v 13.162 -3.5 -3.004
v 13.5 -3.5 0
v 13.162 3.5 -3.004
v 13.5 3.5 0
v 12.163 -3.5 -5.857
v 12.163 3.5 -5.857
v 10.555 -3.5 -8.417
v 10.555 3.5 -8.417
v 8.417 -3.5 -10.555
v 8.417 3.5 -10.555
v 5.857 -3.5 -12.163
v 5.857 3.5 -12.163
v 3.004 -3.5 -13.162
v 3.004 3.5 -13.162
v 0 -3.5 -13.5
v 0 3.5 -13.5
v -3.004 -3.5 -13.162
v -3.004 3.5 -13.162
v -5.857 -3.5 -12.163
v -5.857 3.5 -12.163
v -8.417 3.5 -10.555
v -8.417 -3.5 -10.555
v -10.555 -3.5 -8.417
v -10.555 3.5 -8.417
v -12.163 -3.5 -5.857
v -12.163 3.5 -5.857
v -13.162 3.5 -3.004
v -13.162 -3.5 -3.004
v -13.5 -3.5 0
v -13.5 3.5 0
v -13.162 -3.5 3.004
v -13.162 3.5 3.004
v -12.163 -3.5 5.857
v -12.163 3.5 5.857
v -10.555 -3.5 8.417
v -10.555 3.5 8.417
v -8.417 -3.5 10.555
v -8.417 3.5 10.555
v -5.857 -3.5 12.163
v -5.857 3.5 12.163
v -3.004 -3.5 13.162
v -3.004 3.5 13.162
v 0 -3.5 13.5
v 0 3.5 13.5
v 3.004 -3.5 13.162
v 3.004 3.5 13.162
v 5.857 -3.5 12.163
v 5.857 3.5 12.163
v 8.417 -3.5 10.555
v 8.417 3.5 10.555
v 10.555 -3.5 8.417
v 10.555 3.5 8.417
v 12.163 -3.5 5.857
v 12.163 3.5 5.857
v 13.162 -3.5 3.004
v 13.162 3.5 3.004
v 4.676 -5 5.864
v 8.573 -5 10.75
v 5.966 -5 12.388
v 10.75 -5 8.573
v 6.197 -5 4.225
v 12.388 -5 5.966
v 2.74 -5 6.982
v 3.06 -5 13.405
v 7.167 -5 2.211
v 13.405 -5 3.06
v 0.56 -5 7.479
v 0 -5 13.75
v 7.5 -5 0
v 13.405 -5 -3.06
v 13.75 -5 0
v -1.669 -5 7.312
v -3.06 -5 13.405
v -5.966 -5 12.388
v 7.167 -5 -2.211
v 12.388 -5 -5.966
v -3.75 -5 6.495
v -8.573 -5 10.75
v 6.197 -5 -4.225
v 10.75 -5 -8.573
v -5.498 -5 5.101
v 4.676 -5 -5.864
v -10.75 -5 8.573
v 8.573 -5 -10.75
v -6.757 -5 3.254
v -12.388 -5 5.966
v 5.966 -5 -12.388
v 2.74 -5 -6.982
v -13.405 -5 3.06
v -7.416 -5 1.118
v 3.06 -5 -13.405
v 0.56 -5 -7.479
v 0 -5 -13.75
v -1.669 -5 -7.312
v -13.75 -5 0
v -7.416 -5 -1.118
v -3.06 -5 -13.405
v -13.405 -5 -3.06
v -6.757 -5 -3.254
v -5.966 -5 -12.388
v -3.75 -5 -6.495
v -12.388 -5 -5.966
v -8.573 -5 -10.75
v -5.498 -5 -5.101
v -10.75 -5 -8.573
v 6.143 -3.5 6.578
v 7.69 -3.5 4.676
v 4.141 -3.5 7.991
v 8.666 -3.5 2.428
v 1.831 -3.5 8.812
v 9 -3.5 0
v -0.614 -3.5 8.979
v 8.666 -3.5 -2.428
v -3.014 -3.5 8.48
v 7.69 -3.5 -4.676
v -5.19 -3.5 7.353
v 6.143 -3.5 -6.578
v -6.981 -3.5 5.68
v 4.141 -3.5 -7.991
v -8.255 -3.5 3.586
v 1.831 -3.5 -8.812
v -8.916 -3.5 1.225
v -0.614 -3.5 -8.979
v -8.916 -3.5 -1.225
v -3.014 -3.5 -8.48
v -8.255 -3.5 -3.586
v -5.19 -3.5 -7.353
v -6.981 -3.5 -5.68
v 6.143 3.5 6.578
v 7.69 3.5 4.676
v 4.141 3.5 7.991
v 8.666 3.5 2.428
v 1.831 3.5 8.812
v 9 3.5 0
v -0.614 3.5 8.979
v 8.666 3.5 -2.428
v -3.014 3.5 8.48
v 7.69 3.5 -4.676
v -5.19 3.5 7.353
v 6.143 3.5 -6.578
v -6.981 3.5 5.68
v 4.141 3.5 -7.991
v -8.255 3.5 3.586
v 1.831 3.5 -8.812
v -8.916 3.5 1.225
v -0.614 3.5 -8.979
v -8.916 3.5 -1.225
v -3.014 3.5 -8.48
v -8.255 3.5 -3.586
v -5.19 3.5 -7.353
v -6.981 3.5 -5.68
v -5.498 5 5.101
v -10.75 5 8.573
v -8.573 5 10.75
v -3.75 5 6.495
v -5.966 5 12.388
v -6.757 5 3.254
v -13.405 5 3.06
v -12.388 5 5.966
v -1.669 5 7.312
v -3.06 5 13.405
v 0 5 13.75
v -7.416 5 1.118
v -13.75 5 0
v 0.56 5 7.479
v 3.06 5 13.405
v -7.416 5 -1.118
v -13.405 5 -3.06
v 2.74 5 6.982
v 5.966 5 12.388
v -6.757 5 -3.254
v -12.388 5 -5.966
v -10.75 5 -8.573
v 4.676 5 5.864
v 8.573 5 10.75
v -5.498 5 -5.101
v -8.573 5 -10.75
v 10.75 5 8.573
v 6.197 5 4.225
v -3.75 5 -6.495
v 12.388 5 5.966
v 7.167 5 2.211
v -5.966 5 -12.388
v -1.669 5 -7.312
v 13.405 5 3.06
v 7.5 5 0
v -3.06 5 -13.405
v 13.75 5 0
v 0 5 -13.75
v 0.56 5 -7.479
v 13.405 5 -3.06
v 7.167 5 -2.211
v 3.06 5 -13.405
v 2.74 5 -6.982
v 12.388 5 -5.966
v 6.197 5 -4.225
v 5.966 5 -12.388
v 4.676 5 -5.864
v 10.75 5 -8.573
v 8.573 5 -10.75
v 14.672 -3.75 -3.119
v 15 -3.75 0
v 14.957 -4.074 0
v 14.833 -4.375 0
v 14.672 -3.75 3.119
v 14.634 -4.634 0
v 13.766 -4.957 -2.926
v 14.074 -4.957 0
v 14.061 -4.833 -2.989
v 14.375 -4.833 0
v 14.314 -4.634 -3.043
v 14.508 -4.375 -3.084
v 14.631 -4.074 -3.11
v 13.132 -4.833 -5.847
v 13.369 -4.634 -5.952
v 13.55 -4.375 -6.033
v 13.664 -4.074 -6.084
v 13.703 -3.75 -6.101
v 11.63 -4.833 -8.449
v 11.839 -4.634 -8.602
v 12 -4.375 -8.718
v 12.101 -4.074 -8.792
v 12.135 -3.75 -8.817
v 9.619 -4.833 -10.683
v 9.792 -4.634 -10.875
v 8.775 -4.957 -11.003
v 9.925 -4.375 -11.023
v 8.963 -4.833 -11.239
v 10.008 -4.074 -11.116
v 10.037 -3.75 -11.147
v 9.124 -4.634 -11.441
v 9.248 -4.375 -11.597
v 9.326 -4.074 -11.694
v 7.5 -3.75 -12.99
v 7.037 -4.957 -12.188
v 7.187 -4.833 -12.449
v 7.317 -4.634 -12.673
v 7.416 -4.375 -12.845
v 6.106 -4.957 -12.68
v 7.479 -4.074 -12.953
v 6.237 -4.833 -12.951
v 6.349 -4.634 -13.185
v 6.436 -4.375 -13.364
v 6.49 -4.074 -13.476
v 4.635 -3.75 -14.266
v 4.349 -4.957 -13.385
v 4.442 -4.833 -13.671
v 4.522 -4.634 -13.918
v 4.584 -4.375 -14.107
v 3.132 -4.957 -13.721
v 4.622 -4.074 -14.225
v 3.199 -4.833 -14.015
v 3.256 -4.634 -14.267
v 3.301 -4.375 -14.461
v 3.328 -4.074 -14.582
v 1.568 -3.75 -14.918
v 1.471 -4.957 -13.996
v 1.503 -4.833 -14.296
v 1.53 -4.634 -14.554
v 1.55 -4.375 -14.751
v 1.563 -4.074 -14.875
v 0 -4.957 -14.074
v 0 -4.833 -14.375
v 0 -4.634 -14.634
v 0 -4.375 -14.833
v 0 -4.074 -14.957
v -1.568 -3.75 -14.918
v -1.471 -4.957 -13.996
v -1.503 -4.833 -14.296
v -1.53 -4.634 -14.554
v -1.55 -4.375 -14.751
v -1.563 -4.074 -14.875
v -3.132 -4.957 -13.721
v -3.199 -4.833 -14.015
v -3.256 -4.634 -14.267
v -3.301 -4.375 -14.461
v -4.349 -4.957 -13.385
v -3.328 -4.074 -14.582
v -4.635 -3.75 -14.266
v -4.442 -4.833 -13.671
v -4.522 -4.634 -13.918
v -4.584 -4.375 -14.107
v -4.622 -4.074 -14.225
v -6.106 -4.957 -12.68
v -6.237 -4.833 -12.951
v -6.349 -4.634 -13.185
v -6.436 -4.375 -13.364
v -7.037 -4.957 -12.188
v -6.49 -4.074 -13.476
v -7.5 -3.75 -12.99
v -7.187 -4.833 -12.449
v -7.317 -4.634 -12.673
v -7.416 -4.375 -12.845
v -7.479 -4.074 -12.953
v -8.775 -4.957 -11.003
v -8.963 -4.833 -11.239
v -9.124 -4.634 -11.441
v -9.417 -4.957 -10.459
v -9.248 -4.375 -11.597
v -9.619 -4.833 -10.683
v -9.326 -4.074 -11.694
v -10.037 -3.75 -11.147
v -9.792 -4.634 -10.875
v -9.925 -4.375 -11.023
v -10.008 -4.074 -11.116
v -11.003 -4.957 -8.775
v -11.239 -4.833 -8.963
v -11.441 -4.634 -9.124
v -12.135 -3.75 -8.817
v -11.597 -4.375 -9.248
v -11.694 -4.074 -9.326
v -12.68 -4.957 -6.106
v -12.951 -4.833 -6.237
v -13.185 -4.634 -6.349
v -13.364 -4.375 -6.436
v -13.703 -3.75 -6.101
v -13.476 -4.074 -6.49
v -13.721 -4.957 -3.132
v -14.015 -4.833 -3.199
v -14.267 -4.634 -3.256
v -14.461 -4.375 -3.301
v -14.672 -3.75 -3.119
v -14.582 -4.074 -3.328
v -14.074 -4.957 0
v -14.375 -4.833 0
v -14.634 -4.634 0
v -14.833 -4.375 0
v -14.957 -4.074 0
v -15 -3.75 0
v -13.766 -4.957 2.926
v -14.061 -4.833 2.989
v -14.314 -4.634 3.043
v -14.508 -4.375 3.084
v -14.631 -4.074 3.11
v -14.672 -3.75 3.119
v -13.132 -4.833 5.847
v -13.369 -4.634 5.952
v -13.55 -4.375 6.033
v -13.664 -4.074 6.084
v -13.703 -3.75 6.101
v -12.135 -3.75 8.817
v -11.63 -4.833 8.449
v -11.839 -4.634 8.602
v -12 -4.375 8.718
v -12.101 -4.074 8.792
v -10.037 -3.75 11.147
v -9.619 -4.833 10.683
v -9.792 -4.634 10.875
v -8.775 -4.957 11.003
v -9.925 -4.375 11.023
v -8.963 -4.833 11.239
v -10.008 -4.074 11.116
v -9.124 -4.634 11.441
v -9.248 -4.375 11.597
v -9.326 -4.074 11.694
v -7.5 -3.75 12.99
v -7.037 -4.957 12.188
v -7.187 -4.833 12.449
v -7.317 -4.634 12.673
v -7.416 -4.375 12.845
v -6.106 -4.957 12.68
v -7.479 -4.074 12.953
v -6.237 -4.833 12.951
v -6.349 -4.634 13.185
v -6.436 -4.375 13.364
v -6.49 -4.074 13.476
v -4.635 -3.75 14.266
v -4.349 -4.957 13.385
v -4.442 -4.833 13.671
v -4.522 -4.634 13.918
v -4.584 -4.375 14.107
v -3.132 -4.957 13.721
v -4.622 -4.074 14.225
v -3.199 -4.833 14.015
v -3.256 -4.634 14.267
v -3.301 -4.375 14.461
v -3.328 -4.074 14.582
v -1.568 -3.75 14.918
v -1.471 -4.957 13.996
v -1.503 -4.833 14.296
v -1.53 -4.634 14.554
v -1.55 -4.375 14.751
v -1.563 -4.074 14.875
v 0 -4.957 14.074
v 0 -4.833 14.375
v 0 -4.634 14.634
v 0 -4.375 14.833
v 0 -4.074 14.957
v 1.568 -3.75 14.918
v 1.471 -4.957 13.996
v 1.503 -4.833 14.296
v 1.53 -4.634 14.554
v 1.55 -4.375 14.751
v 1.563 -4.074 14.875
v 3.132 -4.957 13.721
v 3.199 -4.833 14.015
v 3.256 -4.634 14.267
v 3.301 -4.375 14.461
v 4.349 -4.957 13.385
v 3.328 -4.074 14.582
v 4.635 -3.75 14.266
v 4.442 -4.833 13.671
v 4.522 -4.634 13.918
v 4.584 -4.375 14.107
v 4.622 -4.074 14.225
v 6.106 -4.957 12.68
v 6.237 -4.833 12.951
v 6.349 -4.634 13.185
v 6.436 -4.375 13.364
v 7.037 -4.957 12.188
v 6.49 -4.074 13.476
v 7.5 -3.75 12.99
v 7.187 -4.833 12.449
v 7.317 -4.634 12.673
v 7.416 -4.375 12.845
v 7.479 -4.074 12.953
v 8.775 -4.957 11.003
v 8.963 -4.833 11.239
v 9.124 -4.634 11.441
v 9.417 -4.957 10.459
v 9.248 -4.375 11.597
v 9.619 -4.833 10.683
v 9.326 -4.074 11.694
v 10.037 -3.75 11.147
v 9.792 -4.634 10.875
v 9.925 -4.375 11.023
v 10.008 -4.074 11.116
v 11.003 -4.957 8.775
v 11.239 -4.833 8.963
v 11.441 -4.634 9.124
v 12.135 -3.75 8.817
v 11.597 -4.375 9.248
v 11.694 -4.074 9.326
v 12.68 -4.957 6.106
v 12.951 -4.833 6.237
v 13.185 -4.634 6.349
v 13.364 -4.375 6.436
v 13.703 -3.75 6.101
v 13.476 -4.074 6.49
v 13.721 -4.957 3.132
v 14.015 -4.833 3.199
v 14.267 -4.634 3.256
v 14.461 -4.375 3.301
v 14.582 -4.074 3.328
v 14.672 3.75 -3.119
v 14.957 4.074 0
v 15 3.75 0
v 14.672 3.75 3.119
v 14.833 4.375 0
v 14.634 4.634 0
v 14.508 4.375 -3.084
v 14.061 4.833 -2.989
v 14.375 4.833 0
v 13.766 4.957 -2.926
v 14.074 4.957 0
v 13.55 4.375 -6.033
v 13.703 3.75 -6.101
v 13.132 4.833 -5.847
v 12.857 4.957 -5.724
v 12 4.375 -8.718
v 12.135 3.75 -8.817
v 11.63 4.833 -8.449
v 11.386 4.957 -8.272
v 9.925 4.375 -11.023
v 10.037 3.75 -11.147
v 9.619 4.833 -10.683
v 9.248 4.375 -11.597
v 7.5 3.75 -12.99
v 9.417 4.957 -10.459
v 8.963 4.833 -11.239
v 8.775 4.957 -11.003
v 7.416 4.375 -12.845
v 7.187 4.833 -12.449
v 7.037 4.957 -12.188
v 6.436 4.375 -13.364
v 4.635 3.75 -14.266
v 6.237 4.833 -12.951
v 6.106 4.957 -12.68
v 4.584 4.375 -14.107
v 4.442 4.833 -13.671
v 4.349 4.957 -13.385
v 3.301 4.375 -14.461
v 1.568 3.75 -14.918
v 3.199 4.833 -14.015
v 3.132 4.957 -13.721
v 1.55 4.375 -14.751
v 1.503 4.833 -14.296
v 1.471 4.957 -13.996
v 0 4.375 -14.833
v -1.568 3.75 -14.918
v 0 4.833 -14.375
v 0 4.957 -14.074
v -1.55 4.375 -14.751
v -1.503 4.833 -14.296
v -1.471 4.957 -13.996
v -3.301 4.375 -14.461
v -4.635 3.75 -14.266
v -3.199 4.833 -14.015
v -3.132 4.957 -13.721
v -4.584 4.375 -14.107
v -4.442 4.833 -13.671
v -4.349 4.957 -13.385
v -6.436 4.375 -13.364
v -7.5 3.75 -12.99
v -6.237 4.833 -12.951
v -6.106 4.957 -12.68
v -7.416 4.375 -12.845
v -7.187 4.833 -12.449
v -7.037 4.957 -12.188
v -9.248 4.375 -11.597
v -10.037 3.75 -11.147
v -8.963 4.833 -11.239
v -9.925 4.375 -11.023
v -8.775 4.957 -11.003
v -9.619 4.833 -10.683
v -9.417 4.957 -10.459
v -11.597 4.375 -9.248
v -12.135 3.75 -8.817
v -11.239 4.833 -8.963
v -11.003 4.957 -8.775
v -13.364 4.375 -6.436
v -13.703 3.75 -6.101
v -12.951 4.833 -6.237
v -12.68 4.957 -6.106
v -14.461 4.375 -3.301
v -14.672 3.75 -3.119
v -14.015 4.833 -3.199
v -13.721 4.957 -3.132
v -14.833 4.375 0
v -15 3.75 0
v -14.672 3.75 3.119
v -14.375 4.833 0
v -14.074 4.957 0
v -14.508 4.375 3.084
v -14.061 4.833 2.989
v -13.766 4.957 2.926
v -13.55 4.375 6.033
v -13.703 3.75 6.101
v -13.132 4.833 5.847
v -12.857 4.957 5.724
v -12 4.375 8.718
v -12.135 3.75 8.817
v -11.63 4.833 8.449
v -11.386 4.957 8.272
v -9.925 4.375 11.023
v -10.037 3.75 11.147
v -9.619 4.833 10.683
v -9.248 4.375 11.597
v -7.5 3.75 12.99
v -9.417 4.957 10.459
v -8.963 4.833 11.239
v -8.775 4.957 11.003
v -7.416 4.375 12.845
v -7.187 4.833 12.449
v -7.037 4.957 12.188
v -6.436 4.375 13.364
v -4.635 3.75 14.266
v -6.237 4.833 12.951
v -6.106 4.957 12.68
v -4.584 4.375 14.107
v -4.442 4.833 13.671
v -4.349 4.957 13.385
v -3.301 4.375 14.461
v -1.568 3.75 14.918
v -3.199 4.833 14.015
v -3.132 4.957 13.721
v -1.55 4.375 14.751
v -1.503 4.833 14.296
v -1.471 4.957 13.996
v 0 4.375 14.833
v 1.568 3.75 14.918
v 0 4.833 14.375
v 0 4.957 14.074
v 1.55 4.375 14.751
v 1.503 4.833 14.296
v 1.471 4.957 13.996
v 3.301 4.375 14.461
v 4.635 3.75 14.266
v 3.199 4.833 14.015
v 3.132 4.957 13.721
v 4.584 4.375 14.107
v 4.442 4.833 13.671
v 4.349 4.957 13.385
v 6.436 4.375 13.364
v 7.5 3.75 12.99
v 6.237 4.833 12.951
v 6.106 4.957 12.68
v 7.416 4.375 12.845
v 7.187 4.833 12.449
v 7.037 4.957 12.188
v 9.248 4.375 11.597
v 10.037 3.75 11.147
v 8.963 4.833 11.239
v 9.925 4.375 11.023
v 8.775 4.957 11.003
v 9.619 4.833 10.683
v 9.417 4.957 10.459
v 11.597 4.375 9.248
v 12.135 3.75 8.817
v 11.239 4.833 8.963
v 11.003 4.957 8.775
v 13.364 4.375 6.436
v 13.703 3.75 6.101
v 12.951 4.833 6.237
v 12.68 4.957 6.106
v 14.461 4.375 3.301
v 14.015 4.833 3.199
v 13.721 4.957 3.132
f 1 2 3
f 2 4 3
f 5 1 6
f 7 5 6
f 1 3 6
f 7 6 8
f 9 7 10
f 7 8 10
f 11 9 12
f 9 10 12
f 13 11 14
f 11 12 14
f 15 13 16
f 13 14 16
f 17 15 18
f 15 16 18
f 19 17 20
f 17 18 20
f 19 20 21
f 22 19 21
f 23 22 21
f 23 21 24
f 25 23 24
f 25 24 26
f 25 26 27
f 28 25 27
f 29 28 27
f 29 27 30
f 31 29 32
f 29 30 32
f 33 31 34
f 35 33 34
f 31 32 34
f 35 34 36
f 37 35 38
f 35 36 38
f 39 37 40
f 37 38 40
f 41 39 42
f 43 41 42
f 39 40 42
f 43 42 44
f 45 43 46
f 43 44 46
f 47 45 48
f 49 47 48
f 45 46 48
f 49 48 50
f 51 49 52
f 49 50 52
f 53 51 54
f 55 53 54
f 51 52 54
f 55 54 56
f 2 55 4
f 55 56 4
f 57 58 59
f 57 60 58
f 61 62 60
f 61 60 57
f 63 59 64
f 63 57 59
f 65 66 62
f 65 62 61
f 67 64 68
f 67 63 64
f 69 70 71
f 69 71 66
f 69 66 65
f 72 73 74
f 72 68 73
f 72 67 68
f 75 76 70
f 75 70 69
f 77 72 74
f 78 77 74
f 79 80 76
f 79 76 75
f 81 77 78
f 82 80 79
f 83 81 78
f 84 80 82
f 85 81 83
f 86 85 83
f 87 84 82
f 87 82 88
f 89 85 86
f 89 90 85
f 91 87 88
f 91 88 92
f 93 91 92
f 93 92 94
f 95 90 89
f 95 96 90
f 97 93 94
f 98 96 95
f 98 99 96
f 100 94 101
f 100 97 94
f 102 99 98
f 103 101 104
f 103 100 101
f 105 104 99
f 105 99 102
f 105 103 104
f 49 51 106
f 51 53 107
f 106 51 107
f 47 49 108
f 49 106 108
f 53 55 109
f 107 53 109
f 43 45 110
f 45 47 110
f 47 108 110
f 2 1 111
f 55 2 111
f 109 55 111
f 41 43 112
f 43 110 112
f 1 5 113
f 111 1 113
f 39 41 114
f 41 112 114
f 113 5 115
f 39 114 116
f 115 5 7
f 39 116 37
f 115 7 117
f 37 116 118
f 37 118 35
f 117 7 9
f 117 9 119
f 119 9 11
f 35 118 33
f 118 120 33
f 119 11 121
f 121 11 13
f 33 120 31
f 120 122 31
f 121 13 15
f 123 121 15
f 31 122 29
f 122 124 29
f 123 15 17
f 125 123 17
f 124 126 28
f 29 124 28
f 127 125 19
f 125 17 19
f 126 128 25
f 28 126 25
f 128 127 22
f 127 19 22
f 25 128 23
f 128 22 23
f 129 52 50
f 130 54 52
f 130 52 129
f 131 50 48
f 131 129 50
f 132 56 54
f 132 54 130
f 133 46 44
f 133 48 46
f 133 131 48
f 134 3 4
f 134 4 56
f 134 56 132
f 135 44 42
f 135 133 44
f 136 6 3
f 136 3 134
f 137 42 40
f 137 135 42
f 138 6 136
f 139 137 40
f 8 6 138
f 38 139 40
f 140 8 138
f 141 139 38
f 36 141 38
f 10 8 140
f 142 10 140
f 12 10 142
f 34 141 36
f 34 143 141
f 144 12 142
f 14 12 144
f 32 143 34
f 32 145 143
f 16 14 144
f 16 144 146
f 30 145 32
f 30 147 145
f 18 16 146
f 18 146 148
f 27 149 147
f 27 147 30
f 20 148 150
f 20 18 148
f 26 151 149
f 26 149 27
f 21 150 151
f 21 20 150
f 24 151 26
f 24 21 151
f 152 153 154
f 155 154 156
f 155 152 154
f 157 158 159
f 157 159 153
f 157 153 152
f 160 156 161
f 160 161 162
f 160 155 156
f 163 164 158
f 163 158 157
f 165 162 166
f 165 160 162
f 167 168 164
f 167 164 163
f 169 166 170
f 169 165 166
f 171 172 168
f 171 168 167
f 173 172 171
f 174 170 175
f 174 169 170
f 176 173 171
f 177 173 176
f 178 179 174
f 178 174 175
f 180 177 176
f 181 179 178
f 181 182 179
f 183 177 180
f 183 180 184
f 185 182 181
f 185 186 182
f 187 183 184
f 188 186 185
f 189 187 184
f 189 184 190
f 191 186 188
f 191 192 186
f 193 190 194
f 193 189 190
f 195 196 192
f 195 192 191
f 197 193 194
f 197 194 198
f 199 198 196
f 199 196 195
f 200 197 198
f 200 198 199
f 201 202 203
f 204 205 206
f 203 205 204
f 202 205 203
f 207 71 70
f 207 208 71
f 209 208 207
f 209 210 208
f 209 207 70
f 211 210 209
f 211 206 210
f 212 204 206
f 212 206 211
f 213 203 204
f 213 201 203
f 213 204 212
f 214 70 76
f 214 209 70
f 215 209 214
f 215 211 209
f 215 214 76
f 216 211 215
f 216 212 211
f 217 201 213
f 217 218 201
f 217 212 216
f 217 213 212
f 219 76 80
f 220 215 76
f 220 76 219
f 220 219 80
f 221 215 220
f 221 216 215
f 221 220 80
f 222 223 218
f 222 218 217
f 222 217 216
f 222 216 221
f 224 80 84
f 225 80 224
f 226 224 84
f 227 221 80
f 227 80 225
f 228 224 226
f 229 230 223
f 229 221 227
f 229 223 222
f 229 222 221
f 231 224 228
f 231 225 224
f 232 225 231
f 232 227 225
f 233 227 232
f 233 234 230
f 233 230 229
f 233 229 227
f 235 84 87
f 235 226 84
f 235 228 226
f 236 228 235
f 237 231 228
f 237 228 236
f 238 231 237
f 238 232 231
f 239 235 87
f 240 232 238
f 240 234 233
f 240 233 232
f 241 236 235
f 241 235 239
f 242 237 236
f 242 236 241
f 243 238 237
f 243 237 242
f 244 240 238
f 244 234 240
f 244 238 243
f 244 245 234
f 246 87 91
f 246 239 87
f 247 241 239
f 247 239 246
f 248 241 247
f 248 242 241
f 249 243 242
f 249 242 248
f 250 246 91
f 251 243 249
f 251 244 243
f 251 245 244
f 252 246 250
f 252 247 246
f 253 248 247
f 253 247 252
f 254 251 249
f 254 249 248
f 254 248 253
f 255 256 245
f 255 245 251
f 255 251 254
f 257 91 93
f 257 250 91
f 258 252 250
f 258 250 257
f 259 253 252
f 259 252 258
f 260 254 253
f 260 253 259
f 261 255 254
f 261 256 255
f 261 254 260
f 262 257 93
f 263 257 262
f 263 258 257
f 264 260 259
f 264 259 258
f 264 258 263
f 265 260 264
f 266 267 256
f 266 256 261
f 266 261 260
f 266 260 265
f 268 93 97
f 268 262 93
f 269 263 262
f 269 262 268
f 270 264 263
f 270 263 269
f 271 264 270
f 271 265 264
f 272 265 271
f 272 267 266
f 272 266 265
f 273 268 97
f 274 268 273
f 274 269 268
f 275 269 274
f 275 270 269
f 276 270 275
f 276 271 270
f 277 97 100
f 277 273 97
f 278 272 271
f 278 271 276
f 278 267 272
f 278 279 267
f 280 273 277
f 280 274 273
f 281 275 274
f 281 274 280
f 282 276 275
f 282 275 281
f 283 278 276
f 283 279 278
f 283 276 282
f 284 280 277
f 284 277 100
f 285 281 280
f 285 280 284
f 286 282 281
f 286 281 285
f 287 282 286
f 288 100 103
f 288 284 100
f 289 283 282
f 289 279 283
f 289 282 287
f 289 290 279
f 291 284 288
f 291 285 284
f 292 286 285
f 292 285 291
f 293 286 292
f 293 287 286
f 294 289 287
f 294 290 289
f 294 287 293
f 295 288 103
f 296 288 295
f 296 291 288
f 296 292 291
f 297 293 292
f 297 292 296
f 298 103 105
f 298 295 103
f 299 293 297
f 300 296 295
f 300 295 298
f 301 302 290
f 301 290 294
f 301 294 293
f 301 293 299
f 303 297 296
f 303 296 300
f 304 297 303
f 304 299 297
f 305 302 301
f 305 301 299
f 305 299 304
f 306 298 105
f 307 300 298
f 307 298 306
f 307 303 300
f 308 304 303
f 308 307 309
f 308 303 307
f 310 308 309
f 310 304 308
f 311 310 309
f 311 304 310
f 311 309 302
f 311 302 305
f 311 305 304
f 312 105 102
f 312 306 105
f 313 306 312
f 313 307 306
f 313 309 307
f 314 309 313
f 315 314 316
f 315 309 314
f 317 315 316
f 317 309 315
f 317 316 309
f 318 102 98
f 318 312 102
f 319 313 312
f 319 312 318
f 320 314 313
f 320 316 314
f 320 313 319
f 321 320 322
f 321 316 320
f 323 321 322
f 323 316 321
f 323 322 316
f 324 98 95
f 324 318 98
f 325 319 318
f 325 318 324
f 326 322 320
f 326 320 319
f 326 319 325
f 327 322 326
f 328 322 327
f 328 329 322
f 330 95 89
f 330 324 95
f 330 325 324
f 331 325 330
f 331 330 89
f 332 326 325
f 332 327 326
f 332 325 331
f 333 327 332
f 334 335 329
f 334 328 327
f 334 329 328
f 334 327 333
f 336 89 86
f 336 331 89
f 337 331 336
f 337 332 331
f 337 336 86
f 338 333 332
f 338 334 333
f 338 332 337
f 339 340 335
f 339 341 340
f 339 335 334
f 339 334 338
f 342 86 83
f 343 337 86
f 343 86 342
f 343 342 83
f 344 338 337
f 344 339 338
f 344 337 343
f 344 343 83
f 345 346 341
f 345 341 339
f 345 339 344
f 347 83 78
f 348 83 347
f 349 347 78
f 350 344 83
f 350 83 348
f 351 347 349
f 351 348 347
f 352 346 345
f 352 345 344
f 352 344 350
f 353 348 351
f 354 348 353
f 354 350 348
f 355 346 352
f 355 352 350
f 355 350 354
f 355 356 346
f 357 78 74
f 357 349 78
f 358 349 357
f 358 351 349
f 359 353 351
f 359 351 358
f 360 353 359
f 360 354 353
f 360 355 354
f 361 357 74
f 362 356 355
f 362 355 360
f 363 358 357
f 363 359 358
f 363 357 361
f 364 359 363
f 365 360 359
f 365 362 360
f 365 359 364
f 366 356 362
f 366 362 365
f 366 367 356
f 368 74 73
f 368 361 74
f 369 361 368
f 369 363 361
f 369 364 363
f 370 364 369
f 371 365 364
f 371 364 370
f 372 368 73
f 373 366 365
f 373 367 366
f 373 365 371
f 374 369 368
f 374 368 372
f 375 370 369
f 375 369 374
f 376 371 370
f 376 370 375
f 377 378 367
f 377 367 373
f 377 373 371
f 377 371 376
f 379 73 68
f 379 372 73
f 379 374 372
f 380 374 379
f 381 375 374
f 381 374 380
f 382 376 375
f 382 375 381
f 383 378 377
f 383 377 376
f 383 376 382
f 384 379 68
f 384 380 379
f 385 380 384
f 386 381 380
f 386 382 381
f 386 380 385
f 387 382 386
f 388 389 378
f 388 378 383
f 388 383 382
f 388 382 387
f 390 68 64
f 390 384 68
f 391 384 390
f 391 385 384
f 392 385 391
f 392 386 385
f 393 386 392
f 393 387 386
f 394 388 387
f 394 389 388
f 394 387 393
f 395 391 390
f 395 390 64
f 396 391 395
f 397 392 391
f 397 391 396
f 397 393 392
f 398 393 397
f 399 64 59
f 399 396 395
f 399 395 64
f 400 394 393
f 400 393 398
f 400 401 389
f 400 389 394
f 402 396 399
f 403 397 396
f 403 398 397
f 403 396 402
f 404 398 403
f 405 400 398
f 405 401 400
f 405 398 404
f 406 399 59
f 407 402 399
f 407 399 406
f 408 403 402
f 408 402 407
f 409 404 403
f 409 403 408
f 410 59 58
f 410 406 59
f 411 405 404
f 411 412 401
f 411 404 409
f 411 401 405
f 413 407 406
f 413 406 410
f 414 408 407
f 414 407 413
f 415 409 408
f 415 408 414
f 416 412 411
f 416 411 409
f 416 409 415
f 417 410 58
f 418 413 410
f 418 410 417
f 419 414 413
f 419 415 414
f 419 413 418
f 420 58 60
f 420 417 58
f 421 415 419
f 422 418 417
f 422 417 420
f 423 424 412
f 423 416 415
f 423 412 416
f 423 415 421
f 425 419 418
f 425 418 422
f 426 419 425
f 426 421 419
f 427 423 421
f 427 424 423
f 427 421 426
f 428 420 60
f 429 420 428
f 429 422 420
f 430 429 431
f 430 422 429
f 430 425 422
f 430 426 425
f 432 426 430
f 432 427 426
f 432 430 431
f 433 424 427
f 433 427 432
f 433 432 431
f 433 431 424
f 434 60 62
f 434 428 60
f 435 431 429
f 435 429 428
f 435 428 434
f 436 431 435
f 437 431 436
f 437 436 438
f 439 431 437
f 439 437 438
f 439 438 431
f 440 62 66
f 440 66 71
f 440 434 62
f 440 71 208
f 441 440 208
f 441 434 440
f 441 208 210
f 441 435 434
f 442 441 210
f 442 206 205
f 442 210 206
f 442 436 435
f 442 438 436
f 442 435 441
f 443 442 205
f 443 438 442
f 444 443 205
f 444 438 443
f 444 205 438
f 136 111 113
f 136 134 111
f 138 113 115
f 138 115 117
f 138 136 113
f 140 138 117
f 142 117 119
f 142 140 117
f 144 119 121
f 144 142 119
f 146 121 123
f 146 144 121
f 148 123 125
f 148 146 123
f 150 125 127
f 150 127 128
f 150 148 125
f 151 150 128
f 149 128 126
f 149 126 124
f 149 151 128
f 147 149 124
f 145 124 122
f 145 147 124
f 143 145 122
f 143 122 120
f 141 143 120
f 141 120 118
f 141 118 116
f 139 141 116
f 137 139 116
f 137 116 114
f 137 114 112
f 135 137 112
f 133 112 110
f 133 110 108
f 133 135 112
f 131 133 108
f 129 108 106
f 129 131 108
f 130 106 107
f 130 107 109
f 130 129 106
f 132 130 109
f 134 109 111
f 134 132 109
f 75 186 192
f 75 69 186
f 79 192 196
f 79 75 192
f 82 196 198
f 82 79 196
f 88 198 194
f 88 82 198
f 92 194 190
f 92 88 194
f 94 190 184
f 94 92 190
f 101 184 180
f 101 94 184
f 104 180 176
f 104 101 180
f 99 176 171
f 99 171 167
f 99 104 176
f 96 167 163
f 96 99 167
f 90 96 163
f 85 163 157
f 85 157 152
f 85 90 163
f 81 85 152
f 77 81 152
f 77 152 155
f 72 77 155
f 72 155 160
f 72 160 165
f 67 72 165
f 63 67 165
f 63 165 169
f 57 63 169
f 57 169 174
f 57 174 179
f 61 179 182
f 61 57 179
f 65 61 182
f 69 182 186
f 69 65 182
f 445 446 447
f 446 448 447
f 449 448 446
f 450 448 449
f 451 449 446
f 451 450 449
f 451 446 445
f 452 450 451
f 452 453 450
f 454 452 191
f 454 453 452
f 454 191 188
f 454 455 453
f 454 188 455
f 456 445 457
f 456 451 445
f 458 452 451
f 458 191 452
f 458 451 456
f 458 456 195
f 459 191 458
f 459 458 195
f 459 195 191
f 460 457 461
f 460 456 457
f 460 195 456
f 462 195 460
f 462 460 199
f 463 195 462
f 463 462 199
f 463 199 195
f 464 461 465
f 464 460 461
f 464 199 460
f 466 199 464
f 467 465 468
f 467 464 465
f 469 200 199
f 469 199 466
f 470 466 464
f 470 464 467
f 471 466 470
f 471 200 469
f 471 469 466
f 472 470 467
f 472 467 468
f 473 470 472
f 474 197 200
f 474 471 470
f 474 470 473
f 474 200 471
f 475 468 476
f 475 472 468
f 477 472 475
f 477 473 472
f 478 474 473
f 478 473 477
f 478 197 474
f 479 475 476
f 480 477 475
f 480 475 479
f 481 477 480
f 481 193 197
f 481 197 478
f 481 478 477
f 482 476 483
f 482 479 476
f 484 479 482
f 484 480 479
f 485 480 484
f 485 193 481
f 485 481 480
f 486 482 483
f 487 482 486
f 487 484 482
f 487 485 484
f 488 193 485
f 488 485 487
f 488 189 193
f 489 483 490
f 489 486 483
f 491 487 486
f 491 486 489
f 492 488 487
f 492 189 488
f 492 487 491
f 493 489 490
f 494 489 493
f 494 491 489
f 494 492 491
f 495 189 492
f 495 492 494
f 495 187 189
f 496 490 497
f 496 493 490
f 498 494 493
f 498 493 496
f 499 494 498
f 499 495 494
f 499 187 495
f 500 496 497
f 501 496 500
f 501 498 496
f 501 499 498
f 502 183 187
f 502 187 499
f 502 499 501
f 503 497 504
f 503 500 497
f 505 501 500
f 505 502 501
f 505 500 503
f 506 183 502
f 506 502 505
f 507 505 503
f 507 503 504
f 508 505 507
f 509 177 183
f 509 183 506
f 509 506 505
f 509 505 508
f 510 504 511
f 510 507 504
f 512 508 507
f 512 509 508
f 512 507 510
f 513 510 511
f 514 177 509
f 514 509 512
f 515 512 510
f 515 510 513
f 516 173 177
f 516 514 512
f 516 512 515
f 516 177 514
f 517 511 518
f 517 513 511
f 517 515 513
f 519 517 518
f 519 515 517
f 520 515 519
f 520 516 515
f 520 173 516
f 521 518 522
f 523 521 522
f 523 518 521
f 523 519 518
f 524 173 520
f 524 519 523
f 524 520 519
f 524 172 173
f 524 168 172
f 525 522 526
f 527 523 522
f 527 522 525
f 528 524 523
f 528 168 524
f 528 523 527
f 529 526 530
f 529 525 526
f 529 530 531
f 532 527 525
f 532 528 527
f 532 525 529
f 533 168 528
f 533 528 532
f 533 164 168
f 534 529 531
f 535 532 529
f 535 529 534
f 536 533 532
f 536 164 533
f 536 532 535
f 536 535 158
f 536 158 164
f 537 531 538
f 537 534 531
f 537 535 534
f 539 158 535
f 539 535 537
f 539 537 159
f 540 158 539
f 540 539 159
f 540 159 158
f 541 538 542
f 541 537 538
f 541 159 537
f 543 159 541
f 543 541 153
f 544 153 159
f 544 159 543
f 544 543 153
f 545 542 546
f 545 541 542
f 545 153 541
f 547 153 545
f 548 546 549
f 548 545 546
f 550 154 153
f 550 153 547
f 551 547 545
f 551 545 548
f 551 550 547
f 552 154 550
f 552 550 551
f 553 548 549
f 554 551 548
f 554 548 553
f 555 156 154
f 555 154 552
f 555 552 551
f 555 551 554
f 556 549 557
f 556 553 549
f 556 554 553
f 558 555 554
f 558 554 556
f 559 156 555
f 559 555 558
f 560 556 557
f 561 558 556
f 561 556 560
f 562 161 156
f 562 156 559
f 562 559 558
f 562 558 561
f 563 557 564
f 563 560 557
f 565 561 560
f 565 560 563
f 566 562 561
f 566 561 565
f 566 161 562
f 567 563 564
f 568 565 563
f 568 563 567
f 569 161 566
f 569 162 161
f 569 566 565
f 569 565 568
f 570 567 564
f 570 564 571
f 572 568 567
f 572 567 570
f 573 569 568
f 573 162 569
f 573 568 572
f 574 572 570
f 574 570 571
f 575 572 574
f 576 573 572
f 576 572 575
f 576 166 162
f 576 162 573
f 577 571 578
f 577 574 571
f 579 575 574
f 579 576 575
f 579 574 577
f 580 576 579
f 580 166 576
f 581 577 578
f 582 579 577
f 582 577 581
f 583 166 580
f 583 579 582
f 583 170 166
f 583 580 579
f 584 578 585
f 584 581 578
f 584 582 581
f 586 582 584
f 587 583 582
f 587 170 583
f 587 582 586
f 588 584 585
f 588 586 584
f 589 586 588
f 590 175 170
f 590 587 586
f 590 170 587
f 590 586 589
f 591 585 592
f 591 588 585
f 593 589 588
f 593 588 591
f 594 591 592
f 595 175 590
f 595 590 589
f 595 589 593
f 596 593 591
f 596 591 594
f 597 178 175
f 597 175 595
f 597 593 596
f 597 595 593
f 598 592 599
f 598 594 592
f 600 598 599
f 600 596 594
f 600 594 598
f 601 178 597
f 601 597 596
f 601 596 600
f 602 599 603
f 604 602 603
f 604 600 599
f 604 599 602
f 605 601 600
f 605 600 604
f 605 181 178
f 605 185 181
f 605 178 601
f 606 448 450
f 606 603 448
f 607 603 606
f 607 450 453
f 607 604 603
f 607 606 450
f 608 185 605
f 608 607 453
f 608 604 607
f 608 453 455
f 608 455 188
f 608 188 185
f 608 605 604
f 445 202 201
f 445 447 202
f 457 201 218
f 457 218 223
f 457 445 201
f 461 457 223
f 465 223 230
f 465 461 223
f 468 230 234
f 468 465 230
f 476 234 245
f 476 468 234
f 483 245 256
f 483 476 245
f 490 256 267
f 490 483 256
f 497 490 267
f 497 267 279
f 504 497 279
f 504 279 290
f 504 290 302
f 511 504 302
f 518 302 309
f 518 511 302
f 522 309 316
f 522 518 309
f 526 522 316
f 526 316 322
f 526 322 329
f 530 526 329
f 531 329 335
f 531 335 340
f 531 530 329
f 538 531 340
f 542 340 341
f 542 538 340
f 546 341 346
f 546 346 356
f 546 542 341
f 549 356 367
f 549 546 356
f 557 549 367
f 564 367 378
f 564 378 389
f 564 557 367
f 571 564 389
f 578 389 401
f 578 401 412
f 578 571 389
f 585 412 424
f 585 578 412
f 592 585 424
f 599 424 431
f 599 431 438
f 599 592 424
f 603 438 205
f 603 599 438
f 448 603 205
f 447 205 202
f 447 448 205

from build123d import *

# Parameters (mm, degrees)
SKETCH_1_W = 4.5
SKETCH_1_H = 7


with BuildPart() as part:
    # 草图1 → 旋转3 (revolve)
    with BuildSketch(Plane.XY):
        with BuildLine():
            Line((7.5, 5), (7.5, -5))
            Line((7.5, -5), (13.75, -5))
            ThreePointArc((13.75, -5), (14.633883476, -4.633883476), (15, -3.75))
            Line((15, -3.75), (15, 3.75))
            ThreePointArc((15, 3.75), (14.633883476, 4.633883476), (13.75, 5))
            Line((13.75, 5), (7.5, 5))
        make_face()
        with Locations((11.25, 0)):
            Rectangle(SKETCH_1_W, SKETCH_1_H, mode=Mode.SUBTRACT)
    revolve(axis=Axis((0, -346.416551839, 0), (0, 1, 0)))


solid = part.part
